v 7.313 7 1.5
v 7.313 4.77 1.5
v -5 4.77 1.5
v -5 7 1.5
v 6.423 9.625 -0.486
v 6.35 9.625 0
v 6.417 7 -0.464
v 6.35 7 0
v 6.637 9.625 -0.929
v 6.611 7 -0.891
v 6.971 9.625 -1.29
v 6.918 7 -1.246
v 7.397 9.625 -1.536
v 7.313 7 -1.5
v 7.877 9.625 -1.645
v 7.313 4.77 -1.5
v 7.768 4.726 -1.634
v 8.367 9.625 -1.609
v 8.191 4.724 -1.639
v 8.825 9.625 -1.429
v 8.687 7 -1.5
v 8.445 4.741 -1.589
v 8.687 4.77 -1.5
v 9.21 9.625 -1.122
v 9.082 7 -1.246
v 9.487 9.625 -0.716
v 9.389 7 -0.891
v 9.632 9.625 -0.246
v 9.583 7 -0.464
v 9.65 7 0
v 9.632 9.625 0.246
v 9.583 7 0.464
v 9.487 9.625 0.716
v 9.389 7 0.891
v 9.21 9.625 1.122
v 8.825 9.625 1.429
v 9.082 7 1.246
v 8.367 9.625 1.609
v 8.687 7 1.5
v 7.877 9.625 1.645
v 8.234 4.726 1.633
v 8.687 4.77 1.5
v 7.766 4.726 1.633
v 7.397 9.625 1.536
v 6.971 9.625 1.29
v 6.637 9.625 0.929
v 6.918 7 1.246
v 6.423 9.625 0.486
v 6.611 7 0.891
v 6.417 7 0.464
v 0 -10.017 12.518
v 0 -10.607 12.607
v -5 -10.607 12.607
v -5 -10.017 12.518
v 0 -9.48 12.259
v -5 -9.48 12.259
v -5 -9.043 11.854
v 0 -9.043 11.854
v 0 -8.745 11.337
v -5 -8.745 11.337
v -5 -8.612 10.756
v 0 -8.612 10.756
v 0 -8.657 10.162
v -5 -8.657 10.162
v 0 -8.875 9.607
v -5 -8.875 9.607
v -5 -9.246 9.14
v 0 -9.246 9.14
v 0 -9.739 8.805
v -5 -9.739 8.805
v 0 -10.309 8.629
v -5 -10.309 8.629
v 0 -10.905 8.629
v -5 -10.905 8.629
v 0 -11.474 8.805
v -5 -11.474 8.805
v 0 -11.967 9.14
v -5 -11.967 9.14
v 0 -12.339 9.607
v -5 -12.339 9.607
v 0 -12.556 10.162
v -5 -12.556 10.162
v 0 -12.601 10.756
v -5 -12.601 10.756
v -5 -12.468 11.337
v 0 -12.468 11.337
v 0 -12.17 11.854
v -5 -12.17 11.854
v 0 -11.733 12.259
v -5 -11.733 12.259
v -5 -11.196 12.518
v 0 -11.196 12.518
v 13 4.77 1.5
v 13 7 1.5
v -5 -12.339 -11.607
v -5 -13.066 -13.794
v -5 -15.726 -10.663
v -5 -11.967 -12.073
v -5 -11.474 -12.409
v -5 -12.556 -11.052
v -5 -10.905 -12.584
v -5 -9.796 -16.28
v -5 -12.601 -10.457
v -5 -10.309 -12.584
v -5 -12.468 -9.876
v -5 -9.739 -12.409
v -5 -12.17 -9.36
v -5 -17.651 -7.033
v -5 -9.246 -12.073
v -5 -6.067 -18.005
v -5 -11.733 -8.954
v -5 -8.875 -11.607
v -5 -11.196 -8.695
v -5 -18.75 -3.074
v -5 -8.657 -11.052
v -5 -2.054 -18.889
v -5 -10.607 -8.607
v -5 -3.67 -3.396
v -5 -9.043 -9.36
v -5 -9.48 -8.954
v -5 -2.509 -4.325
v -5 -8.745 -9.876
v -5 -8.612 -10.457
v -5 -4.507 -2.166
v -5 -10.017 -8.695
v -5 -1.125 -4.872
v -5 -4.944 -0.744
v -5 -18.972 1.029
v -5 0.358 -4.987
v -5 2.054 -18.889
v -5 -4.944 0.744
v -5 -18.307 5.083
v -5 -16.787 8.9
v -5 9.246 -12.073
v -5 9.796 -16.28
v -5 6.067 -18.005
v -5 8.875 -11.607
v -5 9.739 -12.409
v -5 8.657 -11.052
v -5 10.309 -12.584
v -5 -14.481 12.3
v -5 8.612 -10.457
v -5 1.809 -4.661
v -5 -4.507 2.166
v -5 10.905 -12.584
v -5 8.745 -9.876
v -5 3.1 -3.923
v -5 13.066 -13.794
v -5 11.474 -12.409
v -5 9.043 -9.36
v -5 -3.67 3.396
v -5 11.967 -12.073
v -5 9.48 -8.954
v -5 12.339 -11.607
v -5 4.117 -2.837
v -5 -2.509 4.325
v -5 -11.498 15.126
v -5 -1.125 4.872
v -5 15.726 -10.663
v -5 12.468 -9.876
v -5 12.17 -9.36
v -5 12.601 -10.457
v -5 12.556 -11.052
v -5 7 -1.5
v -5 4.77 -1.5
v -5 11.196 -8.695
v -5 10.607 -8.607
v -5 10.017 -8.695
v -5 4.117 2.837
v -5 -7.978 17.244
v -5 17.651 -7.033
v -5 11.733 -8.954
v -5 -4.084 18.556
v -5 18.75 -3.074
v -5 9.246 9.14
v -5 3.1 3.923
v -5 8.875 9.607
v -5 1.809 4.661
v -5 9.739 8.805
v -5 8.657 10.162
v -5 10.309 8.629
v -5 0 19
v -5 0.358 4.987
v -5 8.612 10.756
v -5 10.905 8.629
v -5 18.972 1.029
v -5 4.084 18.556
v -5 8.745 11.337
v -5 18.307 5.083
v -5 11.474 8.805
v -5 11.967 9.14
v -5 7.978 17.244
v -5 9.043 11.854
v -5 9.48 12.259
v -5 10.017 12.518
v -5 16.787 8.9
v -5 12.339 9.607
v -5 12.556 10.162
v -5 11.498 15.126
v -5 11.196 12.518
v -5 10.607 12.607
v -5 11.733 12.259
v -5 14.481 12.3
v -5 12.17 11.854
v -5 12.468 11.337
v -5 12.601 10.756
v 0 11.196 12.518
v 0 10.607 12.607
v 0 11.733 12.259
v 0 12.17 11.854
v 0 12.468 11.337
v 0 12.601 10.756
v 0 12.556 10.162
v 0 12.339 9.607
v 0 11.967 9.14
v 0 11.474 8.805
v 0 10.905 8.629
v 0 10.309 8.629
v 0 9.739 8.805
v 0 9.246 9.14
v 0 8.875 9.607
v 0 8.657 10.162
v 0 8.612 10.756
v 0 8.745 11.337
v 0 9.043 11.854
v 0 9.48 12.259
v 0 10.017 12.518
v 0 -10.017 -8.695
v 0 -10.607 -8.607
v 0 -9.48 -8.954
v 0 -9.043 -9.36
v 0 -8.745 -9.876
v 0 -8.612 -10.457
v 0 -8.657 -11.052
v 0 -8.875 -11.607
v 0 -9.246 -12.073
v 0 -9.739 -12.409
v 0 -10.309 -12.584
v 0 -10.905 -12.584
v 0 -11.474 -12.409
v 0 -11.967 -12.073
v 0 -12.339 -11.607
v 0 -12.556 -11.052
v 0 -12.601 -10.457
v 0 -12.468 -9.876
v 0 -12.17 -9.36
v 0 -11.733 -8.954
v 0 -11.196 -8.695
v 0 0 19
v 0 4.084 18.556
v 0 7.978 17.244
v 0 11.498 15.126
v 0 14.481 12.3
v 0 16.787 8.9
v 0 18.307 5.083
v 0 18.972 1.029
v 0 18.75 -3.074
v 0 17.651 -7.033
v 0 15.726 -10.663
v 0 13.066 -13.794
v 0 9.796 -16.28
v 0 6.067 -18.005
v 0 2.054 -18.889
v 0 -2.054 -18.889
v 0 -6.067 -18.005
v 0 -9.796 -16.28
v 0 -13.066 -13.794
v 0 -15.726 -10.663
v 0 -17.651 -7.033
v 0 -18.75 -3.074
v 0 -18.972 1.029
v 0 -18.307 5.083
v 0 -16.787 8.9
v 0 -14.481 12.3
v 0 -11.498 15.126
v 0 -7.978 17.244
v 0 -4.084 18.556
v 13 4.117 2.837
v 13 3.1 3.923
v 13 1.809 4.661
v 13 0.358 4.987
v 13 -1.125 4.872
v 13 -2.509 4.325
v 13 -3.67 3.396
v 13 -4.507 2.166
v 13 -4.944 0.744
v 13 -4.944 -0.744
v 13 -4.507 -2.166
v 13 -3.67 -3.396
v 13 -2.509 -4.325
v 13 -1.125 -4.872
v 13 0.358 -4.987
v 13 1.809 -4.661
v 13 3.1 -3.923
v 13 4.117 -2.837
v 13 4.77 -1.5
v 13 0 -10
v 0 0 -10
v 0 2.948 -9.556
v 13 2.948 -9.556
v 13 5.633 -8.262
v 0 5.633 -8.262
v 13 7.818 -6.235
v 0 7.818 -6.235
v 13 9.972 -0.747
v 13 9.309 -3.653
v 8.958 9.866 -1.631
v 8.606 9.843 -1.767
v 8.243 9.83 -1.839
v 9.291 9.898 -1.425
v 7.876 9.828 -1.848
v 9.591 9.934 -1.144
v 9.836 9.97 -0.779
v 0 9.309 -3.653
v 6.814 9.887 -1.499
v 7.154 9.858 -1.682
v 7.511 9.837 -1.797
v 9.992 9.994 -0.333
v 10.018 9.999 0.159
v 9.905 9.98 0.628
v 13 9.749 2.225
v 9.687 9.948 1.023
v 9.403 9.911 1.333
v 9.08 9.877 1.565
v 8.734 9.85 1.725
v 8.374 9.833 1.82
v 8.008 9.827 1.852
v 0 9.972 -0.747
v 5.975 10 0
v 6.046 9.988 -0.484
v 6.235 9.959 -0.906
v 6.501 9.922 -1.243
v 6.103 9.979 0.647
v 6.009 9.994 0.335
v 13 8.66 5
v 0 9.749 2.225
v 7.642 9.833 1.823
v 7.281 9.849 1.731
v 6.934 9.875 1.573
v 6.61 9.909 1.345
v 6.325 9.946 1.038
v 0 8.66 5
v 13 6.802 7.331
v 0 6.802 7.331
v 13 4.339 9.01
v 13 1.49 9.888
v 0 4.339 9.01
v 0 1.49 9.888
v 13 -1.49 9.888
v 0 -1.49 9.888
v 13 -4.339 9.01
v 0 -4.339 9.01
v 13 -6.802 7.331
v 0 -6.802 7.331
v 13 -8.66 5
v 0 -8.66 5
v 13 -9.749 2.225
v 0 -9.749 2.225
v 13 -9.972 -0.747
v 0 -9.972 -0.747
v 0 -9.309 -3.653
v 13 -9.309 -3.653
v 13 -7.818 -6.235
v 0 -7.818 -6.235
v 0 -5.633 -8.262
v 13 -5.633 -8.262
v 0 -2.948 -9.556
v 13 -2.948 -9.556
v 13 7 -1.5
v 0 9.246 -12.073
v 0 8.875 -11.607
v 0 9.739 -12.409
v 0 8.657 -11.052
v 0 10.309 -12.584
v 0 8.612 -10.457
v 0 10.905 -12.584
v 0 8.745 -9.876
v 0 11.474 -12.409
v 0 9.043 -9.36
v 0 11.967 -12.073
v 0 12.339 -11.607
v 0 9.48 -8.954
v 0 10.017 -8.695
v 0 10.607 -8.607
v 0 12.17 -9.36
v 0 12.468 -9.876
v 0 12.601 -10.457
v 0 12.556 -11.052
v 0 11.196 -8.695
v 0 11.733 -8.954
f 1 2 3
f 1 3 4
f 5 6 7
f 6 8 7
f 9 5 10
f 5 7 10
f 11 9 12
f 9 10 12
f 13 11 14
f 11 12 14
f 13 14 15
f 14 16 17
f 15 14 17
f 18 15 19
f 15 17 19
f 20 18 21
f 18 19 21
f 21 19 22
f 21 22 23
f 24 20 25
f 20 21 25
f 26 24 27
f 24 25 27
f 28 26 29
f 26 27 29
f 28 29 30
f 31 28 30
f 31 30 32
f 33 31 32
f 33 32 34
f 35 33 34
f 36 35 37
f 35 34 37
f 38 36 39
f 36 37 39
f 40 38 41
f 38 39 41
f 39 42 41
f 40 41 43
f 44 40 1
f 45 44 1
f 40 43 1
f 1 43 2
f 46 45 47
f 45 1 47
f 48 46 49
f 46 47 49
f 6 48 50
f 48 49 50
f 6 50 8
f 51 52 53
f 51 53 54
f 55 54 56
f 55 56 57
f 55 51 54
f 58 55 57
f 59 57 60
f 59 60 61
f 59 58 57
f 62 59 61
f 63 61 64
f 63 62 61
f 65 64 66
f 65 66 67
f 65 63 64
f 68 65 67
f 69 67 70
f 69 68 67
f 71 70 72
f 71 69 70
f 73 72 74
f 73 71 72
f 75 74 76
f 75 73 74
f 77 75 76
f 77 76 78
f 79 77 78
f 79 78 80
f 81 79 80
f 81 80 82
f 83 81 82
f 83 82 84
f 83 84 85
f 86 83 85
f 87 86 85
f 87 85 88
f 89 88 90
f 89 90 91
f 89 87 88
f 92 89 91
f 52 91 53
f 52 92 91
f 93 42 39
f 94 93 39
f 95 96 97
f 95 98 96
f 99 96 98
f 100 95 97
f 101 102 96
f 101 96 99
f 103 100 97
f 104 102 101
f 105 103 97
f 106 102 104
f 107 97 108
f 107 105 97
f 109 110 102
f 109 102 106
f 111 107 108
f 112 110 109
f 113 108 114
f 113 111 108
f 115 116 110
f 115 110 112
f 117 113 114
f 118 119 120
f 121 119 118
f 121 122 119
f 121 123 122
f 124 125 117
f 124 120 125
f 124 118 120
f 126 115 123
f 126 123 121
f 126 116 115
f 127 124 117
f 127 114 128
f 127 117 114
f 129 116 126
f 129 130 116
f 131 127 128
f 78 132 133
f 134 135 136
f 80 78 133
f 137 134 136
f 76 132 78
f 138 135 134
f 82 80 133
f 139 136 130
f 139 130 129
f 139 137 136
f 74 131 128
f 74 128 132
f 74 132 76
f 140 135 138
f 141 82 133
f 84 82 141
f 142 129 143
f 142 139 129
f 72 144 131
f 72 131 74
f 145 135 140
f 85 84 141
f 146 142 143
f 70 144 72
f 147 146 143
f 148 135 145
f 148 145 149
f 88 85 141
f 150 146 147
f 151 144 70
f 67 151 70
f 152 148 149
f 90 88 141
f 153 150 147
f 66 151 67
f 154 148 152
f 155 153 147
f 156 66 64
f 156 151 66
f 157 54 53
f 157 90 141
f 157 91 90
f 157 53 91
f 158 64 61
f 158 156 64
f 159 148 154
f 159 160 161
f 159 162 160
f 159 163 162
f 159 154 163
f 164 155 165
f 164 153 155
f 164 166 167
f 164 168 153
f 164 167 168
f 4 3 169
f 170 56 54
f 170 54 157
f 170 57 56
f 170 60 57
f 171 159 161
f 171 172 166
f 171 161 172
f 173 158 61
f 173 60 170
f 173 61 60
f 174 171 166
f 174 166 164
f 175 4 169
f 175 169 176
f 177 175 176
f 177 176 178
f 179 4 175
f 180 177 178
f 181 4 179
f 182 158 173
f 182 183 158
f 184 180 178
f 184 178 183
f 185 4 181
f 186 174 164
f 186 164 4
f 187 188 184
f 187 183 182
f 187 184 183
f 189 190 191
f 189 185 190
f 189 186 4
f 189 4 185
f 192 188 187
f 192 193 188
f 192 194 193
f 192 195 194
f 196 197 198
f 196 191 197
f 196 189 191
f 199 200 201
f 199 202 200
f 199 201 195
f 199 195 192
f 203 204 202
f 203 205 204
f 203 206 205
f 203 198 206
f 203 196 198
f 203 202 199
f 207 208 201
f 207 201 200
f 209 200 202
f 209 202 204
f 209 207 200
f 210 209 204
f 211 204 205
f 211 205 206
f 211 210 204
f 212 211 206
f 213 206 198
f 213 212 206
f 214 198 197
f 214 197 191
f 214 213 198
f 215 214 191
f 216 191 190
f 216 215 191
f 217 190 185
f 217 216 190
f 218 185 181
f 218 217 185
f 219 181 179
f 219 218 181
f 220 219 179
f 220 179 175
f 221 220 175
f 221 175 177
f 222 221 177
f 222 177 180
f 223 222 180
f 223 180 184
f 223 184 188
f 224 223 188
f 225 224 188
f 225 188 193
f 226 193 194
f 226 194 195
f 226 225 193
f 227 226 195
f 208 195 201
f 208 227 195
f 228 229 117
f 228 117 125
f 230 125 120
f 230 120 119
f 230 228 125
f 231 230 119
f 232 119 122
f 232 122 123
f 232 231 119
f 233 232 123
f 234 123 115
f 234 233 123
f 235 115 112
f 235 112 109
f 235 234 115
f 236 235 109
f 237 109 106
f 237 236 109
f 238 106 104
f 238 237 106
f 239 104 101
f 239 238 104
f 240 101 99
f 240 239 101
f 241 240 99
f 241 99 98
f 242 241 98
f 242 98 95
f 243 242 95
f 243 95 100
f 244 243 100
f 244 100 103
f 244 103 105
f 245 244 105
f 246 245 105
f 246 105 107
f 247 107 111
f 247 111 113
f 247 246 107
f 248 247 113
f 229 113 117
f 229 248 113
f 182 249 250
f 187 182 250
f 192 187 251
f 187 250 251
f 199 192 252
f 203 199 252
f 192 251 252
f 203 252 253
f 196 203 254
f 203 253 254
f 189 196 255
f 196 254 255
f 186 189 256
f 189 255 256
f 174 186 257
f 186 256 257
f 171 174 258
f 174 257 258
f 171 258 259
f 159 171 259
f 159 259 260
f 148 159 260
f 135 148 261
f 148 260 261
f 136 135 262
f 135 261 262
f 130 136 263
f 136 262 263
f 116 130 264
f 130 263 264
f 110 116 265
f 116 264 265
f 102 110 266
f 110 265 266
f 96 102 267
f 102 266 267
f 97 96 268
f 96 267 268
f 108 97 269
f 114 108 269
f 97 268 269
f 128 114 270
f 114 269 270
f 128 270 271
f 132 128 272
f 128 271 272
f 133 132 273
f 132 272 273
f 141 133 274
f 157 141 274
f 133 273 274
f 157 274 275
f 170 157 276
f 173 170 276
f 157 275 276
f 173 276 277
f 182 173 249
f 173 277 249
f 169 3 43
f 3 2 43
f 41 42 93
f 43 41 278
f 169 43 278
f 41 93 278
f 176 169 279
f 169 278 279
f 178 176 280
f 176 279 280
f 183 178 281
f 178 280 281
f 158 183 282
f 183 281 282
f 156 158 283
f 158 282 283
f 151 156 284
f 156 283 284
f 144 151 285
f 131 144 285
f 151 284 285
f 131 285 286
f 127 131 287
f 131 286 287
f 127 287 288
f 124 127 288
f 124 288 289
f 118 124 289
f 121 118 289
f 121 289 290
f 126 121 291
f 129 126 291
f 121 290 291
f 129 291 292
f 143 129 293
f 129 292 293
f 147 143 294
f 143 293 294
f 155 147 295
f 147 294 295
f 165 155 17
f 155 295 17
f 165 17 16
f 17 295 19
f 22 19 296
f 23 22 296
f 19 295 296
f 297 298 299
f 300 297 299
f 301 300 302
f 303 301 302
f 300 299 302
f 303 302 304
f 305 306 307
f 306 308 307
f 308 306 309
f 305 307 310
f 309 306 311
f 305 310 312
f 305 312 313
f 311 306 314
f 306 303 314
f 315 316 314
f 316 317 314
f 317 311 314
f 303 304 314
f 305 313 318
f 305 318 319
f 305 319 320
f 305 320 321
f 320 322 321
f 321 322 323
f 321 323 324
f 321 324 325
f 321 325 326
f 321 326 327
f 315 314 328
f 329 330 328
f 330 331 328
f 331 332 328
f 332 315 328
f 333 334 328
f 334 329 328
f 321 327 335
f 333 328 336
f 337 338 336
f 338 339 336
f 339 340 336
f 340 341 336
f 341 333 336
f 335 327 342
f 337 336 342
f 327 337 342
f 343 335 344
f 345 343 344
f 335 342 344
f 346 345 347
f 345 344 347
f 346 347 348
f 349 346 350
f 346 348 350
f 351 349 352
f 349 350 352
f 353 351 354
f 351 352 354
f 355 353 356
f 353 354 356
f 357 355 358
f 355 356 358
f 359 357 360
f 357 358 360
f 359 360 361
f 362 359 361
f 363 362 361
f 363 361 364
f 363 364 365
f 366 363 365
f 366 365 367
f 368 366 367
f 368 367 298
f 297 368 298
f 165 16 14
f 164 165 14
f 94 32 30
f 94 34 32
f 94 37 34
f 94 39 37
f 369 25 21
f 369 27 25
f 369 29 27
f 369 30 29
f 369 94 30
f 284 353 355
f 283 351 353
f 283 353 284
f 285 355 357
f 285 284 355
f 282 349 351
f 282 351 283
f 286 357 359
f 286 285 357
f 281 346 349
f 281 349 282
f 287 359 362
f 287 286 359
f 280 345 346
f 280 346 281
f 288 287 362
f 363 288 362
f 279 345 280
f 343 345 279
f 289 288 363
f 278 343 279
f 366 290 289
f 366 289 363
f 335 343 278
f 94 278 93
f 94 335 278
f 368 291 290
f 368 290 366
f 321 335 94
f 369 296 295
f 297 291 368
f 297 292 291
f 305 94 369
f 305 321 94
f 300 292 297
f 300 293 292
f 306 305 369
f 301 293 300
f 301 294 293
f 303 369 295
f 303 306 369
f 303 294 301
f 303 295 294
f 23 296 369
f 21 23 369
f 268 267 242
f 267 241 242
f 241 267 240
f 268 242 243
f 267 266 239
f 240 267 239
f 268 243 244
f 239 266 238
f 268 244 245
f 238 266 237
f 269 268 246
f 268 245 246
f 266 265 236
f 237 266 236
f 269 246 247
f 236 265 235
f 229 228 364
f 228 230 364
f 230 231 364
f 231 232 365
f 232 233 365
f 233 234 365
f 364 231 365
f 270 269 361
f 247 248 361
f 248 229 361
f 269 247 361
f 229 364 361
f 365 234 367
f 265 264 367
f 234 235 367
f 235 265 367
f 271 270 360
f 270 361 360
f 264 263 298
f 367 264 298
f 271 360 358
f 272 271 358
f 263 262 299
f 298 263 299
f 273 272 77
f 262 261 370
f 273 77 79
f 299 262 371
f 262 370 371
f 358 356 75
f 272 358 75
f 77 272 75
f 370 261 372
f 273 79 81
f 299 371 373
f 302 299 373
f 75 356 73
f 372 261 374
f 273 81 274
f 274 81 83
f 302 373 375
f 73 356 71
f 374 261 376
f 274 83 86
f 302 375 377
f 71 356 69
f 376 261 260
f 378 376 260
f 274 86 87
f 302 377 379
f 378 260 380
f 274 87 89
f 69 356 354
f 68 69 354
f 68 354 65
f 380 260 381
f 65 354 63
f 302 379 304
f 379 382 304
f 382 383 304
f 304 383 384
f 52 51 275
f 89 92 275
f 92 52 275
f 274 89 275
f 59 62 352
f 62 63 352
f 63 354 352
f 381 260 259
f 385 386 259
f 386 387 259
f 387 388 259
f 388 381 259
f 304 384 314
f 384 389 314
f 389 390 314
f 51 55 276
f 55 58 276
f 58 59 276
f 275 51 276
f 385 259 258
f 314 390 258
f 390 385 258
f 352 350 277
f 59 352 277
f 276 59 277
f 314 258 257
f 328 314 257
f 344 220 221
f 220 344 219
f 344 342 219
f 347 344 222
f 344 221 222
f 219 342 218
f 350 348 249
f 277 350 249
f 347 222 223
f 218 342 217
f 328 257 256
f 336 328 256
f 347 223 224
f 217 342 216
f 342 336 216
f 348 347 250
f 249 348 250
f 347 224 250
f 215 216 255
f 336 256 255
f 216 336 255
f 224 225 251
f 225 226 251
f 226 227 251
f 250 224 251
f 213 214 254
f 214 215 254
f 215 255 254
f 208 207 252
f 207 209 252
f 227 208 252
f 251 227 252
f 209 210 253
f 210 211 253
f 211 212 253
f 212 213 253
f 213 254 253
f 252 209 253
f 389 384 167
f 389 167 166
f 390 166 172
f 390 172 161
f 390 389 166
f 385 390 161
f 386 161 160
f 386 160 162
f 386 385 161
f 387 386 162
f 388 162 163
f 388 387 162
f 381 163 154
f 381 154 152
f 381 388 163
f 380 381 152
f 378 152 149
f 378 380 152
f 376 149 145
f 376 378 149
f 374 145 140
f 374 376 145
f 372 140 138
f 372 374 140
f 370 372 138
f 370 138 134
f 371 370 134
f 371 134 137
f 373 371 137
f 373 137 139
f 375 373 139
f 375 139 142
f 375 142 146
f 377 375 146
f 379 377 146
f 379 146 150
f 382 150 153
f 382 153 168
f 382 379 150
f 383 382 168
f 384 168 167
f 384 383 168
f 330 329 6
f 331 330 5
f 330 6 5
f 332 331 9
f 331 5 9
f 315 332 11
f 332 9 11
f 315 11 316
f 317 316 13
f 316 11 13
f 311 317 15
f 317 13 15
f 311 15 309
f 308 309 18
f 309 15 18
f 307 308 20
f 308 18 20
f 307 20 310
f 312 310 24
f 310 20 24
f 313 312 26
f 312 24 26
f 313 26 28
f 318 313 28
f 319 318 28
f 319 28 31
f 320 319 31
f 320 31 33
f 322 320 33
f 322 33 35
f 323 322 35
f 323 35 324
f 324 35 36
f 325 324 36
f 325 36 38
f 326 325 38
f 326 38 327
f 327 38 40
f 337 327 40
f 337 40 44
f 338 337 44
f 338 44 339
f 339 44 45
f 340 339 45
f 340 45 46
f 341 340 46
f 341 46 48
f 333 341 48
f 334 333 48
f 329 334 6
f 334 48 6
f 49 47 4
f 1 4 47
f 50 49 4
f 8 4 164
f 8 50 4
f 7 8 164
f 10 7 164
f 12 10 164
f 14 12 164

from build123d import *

# Parameters (mm, degrees)
SKETCH1_R                   = 10
SMALLRING_DEPTH             = 13
SKETCH4_R                   = 19
SKETCH4_R_2                 = 2
BIGRING_DEPTH               = 5
M4_TAPPED_HOLE1_D           = 3.3
M4_TAPPED_HOLE1_DEPTH       = 10.1
M4_TAPPED_HOLE1_CSINK_D     = 4.05
M4_TAPPED_HOLE1_CSINK_ANGLE = 90
M4_TAPPED_HOLE1_TIP         = 0.991420021
SKETCH42_R                  = 5
MOTOR_SHAFT_HOLE_DEPTH      = 20
SKETCH43_W                  = 3
SKETCH43_H                  = 4
KEYWAY_DEPTH                = 18


with BuildPart() as part:
    # Sketch1 → SmallRing (new body)
    with BuildSketch(Plane(origin=(0, 0, 0), x_dir=(0, 0, -1), z_dir=(1, 0, 0))):
        Circle(SKETCH1_R)
    extrude(amount=SMALLRING_DEPTH)

    # Sketch4 → BigRing (add)
    with BuildSketch(Plane.ZY):
        Circle(SKETCH4_R)
        with Locations((-10.606601718, 10.606601718)):
            Circle(SKETCH4_R_2, mode=Mode.SUBTRACT)
        with Locations((10.606601718, 10.606601718)):
            Circle(SKETCH4_R_2, mode=Mode.SUBTRACT)
        with Locations((10.606601718, -10.606601718)):
            Circle(SKETCH4_R_2, mode=Mode.SUBTRACT)
        with Locations((-10.606601718, -10.606601718)):
            Circle(SKETCH4_R_2, mode=Mode.SUBTRACT)
    extrude(amount=BIGRING_DEPTH)

    # M4 Tapped Hole1
    with Locations(Plane(origin=(8, 10, 0), x_dir=(1, 0, 0), z_dir=(0, 1, 0))):
        with Locations((0, 0)):
            CounterSinkHole(M4_TAPPED_HOLE1_D / 2, M4_TAPPED_HOLE1_CSINK_D / 2, depth=M4_TAPPED_HOLE1_DEPTH, counter_sink_angle=M4_TAPPED_HOLE1_CSINK_ANGLE)
            with Locations((0, 0, -(M4_TAPPED_HOLE1_DEPTH + M4_TAPPED_HOLE1_TIP / 2))):  # 118° drill point
                Cone(0, M4_TAPPED_HOLE1_D / 2, M4_TAPPED_HOLE1_TIP, mode=Mode.SUBTRACT)

    # Sketch42 → Motor Shaft Hole (cut)
    with BuildSketch(Plane(origin=(13, 0, 0), x_dir=(0, 0, -1), z_dir=(1, 0, 0))):
        Circle(SKETCH42_R)
    extrude(amount=-MOTOR_SHAFT_HOLE_DEPTH, mode=Mode.SUBTRACT)

    # Sketch43 → Keyway (cut)
    with BuildSketch(Plane(origin=(13, 0, 0), x_dir=(0, 0, -1), z_dir=(1, 0, 0))):
        with Locations((0, 5)):
            Rectangle(SKETCH43_W, SKETCH43_H)
    extrude(amount=-KEYWAY_DEPTH, mode=Mode.SUBTRACT)


solid = part.part
